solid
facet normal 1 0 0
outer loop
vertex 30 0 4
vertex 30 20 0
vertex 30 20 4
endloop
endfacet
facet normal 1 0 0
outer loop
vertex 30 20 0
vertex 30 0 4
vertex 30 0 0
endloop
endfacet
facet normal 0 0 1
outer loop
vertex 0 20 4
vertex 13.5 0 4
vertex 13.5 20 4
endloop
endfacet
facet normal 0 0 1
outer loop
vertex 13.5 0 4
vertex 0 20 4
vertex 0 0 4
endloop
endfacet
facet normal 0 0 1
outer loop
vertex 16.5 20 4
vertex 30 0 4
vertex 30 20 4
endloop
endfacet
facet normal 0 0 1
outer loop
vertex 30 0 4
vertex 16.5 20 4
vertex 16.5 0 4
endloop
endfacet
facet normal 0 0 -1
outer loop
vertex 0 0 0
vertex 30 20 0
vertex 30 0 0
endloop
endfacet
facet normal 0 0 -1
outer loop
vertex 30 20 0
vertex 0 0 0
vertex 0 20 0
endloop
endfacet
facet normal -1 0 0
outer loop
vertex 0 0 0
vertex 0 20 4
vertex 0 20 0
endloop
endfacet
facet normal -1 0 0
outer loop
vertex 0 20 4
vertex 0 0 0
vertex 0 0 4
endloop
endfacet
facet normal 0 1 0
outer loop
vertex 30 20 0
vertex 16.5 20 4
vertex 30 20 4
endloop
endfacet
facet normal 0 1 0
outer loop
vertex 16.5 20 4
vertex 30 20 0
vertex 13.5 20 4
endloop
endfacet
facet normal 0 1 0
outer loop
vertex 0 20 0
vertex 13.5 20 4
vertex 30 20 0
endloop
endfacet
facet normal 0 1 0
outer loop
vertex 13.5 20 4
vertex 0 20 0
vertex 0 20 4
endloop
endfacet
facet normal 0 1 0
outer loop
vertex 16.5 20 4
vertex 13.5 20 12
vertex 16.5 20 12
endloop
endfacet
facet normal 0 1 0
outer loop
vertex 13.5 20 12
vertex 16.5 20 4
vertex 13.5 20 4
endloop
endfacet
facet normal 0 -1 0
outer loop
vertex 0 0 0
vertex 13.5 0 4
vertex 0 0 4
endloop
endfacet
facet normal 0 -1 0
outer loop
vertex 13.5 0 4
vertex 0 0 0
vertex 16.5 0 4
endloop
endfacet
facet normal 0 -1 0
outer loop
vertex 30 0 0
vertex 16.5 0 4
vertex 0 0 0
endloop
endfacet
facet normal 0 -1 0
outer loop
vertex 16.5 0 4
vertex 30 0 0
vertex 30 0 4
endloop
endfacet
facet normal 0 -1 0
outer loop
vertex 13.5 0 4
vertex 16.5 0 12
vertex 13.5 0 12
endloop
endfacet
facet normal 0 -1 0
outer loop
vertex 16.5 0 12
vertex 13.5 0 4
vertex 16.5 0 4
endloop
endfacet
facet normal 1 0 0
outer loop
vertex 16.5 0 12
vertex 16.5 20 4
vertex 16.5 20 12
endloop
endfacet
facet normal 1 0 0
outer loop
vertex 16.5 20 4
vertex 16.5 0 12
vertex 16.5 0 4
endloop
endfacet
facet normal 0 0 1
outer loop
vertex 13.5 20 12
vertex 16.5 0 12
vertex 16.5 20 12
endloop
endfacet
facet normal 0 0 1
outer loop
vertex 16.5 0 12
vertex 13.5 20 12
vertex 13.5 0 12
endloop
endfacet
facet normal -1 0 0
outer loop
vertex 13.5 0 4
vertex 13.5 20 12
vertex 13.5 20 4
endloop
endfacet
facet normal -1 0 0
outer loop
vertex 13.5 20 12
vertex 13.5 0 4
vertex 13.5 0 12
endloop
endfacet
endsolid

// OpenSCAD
// units=mm — generated by scad_emitter.py
// part=unnamed
$fn = 48;

union() { cube([30, 20, 4]); translate([13.5, 0, 3.5]) cube([3, 20, 8.5]); }
